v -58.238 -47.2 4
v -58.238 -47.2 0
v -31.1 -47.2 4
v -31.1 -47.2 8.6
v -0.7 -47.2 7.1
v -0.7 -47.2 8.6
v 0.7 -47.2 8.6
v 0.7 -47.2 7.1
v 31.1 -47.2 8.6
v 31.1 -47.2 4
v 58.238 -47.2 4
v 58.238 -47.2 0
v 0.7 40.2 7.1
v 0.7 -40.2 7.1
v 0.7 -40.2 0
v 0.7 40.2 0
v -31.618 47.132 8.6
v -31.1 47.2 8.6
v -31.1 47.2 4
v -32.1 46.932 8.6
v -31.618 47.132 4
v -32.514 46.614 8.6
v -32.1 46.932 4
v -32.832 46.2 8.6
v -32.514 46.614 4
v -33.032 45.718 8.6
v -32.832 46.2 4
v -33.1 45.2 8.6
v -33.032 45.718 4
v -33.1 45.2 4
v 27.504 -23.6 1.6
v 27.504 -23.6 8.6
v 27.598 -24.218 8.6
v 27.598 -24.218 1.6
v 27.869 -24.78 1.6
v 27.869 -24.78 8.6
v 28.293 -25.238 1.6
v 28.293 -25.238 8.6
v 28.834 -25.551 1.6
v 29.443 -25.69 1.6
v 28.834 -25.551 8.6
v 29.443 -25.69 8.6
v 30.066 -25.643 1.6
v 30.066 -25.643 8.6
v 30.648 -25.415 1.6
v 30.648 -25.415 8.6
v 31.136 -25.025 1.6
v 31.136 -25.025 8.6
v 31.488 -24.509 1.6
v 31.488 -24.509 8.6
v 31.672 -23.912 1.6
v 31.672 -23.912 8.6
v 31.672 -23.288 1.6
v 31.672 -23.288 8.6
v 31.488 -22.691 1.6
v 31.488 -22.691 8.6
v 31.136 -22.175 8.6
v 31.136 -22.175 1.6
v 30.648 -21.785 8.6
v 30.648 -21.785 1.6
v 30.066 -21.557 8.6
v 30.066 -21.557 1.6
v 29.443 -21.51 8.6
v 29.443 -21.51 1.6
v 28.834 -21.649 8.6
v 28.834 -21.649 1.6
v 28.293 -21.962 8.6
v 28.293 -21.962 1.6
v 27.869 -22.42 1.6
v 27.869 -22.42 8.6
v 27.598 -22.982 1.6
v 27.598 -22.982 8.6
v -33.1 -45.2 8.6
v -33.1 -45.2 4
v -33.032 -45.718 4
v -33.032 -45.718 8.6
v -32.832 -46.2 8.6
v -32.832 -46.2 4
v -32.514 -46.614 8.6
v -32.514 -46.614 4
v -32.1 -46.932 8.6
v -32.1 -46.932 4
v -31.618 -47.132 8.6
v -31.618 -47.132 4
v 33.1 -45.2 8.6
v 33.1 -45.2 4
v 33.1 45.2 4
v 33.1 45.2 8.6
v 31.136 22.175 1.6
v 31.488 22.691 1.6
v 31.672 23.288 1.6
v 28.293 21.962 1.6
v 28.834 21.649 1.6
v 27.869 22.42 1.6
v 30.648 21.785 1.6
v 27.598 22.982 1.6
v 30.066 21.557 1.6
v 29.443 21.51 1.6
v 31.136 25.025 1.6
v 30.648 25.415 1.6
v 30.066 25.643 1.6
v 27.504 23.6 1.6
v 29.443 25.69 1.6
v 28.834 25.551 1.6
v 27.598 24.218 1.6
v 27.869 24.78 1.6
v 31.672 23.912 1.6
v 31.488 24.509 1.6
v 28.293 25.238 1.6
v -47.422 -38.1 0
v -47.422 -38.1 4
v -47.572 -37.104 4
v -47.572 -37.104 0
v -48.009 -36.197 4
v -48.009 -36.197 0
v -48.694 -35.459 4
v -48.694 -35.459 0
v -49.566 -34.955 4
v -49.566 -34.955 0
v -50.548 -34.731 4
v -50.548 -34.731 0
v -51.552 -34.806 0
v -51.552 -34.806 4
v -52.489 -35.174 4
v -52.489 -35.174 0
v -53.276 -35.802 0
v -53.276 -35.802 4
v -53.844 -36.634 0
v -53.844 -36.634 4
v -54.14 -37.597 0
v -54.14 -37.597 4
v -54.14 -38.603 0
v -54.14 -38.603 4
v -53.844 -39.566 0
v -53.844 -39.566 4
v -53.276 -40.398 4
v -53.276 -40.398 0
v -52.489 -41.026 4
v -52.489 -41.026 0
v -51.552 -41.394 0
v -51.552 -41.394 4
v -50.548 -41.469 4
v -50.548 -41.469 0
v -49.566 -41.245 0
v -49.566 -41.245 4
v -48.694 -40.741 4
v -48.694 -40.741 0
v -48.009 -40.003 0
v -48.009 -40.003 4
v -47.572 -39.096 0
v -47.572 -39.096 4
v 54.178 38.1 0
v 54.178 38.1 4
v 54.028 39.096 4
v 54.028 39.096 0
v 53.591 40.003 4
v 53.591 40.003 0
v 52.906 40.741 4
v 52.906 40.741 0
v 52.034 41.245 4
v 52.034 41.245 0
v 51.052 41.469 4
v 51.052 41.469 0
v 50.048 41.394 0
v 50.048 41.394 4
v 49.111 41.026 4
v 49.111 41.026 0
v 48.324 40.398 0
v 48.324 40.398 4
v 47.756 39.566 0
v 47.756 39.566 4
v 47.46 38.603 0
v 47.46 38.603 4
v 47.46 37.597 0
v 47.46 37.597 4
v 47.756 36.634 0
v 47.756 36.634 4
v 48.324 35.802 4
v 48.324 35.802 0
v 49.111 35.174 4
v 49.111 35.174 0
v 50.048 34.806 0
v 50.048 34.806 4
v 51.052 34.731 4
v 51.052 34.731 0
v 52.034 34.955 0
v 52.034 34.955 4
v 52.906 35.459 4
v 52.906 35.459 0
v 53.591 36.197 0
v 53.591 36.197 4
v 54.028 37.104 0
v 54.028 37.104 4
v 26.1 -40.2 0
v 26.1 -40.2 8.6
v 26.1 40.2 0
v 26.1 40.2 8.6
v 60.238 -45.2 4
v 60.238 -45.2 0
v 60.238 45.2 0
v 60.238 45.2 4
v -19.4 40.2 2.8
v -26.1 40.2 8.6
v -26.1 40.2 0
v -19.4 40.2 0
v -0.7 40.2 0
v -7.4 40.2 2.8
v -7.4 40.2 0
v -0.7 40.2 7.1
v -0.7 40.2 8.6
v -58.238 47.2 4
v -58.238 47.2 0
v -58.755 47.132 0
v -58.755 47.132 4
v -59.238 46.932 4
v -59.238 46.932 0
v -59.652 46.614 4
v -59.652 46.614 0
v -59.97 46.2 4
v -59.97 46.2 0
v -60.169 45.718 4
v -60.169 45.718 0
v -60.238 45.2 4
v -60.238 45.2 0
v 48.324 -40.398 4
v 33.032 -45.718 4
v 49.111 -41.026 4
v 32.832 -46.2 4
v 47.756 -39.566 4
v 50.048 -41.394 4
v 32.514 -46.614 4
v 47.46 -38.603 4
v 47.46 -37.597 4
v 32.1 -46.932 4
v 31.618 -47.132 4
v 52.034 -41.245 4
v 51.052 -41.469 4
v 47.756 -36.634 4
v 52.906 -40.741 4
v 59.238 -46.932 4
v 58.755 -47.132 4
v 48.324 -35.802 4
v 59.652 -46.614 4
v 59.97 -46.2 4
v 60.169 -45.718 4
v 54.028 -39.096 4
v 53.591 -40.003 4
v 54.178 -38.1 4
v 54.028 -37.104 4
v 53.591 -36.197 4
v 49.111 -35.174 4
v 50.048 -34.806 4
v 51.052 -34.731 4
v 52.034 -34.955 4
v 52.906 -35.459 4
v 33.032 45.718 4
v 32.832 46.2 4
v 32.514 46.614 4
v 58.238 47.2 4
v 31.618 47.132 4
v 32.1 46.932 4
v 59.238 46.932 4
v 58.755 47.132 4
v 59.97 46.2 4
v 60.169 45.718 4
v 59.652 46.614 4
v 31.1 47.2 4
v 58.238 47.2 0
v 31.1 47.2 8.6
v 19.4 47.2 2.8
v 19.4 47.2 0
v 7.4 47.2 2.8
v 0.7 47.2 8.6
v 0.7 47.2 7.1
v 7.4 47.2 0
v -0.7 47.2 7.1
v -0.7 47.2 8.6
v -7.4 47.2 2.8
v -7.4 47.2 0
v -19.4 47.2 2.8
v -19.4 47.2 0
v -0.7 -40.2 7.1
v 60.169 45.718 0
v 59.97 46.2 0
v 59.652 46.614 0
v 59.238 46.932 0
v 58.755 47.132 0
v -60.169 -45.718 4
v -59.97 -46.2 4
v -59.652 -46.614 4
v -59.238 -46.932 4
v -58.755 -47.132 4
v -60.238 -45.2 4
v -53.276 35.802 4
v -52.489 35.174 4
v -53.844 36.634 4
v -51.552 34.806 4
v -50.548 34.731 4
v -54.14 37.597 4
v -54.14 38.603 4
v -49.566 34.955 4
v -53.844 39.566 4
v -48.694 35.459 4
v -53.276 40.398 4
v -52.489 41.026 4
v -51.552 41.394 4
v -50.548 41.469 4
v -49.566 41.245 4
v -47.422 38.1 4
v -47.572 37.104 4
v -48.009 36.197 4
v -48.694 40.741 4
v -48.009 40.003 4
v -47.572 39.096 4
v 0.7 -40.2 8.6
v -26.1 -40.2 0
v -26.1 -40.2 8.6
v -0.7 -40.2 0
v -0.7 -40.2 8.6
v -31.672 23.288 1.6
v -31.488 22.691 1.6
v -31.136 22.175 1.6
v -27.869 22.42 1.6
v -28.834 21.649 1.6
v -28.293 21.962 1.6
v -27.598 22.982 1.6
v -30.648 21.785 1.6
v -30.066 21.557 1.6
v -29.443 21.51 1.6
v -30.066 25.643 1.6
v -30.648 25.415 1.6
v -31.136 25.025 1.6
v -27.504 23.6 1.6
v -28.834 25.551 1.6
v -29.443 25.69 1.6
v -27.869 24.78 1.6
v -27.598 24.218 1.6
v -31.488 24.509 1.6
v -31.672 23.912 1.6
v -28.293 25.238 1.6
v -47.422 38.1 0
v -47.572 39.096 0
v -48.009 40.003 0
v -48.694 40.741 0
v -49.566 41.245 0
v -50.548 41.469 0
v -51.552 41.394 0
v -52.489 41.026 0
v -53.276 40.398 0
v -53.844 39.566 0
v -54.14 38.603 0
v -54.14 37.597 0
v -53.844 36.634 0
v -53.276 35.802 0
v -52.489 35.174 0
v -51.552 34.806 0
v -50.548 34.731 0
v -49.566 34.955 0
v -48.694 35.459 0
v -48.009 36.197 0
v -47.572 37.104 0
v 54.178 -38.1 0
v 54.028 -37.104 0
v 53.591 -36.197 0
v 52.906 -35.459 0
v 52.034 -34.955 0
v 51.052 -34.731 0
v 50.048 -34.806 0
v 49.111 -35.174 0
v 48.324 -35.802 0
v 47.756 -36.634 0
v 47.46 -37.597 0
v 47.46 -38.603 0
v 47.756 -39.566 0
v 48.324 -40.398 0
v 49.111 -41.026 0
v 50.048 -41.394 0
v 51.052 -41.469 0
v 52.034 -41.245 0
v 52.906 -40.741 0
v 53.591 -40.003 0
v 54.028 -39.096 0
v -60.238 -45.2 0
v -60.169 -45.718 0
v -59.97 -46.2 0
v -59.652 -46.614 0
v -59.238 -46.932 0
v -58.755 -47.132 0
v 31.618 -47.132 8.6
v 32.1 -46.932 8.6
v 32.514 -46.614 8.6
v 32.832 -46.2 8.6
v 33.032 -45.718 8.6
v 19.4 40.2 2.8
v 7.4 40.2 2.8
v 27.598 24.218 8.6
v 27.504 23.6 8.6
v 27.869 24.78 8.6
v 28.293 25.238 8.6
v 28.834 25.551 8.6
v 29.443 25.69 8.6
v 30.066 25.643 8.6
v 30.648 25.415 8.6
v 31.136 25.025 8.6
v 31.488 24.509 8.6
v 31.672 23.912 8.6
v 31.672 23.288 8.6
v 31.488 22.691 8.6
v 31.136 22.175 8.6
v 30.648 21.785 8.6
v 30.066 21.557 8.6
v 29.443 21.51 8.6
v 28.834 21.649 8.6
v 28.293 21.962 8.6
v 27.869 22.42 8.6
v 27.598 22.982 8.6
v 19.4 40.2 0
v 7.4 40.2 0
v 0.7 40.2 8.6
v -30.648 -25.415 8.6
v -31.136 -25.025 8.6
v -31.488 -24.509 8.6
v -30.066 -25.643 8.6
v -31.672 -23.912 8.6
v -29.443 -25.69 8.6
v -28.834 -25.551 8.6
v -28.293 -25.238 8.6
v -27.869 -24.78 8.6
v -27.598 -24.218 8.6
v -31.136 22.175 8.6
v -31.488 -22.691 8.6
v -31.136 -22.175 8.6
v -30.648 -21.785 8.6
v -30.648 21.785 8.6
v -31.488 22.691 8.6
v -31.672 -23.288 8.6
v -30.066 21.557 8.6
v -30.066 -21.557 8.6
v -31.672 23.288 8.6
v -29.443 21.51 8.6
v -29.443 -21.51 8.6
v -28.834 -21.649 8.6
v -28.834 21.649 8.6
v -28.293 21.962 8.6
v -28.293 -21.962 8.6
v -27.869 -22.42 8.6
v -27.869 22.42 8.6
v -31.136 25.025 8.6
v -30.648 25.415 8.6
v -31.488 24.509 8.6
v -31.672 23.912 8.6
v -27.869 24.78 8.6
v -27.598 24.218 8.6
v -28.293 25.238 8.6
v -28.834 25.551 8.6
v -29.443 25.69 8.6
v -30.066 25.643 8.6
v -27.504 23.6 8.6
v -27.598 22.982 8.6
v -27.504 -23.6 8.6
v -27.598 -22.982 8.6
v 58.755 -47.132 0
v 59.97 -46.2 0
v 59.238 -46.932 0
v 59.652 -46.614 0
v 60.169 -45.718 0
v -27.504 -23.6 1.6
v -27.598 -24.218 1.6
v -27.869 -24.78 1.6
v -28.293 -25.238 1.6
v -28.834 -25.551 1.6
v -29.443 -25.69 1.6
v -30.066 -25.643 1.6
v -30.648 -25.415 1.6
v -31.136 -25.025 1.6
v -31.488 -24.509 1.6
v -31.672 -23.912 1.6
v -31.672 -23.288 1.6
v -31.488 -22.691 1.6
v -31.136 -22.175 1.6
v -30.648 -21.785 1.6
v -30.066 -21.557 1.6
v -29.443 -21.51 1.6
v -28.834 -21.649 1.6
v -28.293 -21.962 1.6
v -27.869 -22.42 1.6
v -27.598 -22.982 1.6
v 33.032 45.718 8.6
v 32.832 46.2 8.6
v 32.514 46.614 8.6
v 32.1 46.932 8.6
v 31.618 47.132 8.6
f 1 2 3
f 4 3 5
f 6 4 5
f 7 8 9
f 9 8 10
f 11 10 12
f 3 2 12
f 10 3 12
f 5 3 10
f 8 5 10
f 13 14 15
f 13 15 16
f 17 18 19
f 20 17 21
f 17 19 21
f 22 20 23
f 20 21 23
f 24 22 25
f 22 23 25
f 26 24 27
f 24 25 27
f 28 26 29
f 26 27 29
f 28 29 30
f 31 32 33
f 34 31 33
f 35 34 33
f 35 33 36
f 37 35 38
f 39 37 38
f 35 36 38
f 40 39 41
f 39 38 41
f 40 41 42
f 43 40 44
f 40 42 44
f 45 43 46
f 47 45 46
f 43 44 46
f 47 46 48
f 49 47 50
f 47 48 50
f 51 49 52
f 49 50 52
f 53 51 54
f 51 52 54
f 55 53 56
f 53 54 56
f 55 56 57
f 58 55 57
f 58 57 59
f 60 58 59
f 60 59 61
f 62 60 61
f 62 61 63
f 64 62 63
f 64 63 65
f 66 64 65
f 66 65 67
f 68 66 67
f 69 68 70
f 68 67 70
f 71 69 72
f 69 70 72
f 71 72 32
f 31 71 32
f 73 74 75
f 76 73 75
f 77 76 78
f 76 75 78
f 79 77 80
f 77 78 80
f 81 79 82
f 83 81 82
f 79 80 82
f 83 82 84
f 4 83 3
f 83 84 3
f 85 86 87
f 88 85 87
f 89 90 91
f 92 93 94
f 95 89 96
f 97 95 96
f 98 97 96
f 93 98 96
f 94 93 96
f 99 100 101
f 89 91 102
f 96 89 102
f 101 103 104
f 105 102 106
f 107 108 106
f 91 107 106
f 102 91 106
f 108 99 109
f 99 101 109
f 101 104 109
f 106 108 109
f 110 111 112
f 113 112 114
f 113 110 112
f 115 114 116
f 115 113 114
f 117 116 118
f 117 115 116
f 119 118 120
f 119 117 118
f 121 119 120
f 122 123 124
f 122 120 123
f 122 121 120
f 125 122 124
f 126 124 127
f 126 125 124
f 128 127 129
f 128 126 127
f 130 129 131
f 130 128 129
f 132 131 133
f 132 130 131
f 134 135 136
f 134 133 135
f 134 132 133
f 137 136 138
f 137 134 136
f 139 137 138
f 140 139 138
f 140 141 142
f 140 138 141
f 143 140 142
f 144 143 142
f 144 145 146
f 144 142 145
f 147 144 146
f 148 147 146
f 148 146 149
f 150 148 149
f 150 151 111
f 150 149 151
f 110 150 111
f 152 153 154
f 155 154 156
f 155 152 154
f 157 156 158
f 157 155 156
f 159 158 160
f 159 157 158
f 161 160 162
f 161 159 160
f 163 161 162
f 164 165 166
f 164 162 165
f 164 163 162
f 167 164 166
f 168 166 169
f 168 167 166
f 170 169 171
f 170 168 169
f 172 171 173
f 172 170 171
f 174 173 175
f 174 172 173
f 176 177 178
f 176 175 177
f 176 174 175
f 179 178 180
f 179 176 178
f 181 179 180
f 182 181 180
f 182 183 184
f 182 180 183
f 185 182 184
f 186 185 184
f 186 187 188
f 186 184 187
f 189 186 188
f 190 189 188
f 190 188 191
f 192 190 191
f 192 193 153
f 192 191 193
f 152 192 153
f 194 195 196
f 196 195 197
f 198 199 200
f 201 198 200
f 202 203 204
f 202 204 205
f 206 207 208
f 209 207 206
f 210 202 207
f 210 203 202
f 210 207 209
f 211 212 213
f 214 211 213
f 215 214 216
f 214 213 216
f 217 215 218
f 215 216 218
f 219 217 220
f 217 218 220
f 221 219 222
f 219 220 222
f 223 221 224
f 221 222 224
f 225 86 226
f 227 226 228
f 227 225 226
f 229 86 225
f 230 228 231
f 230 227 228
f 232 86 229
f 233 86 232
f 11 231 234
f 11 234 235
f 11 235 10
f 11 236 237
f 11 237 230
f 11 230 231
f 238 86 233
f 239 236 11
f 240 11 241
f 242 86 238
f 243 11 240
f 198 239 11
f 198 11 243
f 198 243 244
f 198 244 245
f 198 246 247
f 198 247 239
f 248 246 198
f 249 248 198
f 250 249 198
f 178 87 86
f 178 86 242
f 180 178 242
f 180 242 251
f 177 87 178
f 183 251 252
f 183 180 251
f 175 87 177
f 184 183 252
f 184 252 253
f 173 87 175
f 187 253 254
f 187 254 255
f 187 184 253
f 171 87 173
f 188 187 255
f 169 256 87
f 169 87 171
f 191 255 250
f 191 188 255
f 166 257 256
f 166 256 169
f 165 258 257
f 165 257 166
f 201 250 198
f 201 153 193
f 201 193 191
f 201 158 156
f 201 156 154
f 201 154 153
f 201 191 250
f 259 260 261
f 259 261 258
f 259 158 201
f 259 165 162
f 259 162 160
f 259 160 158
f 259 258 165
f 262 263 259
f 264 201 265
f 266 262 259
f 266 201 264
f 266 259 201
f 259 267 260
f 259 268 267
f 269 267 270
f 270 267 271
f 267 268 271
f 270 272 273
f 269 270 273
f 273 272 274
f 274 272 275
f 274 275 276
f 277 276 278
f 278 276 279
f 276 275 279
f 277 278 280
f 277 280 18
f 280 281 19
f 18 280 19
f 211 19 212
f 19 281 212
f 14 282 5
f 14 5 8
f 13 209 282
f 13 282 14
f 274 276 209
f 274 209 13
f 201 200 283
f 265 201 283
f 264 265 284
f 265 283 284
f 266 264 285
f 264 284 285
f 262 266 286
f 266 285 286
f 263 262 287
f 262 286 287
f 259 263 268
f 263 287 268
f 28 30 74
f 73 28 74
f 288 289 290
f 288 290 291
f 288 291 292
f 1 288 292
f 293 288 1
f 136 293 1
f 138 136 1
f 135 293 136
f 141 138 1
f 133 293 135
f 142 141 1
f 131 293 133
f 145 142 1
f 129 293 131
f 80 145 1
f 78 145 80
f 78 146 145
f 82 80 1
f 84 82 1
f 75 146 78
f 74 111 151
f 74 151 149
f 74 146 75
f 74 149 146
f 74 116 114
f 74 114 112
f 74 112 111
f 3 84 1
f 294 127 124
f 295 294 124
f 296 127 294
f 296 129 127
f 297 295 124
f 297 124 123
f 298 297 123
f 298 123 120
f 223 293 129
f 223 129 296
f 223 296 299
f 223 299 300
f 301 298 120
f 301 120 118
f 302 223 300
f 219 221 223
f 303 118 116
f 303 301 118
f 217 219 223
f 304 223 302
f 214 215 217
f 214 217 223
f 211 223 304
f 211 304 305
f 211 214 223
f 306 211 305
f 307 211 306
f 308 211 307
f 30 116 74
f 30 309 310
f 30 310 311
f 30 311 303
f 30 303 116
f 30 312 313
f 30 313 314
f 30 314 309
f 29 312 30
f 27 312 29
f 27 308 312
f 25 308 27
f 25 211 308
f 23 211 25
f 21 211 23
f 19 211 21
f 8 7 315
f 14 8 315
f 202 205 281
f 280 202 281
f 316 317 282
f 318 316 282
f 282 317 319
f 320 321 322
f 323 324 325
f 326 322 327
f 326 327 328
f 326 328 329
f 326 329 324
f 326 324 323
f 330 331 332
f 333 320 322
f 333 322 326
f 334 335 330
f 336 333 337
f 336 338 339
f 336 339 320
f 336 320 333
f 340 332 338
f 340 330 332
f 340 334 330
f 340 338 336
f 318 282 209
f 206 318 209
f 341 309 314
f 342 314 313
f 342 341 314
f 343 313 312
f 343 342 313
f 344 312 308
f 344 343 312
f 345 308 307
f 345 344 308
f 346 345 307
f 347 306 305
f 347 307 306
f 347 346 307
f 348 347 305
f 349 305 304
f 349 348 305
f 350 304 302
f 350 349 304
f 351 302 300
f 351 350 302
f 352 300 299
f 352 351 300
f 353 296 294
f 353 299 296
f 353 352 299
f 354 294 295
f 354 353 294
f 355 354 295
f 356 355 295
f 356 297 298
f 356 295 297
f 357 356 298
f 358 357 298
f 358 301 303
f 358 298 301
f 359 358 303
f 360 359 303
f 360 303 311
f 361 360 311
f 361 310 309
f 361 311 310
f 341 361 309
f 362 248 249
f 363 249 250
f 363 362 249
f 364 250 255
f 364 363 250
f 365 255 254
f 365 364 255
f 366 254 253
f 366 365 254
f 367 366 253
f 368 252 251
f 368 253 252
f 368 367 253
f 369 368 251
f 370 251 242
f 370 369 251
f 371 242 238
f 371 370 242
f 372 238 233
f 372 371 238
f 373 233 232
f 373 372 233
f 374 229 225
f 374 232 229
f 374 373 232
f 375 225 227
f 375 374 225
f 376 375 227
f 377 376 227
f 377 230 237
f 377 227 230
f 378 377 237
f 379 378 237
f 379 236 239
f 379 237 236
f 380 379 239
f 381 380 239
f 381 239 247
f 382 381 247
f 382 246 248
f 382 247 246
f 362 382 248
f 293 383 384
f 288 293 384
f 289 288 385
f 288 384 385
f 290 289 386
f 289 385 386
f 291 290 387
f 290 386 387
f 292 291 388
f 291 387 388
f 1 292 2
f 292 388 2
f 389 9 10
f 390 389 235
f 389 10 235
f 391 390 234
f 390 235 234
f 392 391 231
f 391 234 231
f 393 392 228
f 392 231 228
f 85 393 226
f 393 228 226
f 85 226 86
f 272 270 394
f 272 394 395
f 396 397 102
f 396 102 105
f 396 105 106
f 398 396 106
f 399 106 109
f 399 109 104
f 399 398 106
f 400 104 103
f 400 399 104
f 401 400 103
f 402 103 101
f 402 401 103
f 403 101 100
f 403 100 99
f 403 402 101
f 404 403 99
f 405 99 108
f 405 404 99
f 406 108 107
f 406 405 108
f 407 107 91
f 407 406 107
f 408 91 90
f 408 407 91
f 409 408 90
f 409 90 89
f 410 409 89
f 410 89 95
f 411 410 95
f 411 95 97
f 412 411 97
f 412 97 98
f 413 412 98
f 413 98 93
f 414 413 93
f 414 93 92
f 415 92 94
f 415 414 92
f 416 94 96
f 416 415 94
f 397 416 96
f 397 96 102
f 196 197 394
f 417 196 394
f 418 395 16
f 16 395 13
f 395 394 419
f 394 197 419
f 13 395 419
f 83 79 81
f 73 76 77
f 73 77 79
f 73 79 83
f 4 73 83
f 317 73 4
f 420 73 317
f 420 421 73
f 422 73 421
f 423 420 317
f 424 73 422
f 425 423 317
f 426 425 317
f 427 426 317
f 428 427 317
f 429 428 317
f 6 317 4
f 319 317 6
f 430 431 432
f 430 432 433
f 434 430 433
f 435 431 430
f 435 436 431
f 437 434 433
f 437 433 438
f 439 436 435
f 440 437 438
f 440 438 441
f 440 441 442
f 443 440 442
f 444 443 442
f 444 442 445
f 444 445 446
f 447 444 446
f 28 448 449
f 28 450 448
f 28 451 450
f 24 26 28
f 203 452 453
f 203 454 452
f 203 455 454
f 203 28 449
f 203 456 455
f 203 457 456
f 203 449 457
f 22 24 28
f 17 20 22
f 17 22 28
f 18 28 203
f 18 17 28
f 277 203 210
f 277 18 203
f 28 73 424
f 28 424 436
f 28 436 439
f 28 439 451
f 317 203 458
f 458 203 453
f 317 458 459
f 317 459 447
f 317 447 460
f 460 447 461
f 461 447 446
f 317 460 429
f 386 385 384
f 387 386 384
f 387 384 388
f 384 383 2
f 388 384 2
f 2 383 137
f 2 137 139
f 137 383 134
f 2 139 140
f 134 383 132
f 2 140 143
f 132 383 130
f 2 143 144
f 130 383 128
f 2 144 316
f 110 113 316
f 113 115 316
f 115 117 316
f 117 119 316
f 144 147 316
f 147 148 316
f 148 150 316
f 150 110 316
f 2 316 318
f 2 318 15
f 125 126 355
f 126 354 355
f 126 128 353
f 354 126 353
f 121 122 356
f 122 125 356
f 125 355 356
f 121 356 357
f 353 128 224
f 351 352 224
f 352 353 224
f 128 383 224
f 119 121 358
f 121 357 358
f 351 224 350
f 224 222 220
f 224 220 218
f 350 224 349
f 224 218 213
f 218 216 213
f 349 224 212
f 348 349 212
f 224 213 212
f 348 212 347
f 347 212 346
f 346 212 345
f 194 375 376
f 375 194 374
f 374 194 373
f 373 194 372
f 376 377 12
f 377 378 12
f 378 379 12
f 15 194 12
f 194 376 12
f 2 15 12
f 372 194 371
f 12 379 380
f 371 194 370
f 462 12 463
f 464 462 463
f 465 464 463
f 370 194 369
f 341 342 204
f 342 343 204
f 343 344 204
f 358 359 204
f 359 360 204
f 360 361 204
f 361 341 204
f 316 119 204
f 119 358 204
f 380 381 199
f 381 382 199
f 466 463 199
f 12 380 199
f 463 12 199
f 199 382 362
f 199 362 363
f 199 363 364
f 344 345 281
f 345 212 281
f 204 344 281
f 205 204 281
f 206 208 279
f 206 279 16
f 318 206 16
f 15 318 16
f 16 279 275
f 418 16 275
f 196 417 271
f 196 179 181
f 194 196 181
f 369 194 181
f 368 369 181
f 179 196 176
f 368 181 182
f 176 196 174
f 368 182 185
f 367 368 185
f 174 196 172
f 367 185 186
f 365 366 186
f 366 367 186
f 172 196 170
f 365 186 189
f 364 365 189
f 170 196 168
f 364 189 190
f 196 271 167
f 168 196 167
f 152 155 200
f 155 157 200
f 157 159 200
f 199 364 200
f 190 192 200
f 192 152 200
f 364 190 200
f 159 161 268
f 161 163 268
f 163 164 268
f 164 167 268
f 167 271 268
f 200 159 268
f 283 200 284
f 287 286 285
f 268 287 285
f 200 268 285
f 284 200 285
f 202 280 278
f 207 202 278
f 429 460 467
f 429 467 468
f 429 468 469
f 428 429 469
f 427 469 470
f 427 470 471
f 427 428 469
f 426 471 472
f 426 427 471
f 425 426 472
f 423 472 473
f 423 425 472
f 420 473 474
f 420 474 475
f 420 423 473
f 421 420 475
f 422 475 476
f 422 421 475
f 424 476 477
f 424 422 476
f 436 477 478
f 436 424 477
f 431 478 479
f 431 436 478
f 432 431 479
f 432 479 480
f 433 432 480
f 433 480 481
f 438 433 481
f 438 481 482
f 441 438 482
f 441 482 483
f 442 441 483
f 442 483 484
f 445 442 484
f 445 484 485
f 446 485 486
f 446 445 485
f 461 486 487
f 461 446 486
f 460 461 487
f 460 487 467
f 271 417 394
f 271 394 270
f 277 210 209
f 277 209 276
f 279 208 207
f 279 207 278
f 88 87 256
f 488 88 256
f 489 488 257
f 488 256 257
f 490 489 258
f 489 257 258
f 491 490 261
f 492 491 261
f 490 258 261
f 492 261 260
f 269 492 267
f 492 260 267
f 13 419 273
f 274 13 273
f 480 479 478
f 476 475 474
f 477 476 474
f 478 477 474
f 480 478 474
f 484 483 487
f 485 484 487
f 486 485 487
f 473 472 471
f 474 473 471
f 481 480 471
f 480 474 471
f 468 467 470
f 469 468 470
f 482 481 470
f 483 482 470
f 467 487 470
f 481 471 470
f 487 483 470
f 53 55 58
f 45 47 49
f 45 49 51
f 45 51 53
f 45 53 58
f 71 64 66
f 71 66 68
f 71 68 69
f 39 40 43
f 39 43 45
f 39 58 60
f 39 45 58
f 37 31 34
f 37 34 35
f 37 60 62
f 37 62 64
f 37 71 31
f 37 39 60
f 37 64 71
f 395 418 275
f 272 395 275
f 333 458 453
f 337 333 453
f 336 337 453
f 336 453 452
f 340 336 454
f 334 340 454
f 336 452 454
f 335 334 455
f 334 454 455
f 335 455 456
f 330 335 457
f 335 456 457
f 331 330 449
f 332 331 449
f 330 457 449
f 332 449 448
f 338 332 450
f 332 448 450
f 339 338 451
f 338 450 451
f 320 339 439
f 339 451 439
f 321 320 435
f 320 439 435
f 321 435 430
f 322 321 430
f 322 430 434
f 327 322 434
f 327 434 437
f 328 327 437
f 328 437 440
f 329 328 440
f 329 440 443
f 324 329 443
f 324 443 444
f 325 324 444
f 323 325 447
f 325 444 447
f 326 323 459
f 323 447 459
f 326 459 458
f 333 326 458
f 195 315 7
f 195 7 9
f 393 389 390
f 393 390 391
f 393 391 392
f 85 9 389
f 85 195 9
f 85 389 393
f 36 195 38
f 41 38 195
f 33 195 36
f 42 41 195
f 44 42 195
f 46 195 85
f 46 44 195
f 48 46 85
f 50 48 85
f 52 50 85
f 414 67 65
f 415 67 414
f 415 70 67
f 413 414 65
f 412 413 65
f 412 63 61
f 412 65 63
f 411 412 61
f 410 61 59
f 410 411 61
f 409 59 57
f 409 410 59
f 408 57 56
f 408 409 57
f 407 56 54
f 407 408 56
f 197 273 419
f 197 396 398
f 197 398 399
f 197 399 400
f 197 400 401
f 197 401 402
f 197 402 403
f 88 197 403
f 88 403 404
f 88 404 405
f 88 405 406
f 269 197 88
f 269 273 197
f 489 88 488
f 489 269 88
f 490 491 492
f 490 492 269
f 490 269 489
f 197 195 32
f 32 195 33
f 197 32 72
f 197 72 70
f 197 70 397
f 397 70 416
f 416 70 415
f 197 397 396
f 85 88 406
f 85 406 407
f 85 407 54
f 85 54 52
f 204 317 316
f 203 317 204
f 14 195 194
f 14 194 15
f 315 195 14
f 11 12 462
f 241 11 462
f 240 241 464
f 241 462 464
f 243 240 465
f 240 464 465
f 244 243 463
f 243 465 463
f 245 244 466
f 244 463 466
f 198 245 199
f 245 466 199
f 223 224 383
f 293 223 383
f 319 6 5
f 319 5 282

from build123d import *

# Parameters (mm, degrees)
PAD_DEPTH                     = 8.6
PAD001_DEPTH                  = 4
SKETCH002_W                   = 1.4
SKETCH002_H                   = 94.4
POCKET001_DEPTH               = 1.5
SKETCH003_W                   = 25.4
SKETCH003_H                   = 80.4
POCKET_DEPTH                  = 8.6
SKETCH009_R                   = 3.3782
POCKET008_DEPTH               = 8.601
SKETCH008_R                   = 2.0955
POCKET005_DEPTH               = 7
SKETCH008_MIRRORED004_2_R     = 2.0955
POCKET005_MIRRORED004_2_DEPTH = 7
SKETCH010_W                   = 12
SKETCH010_H                   = 7
POCKET007_DEPTH               = 2.8


with BuildPart() as part:
    # Sketch → Pad (new body)
    with BuildSketch(Plane.XY):
        with BuildLine():
            Line((-33.1, 45.2), (-33.1, -45.2))
            ThreePointArc((-33.1, -45.2), (-32.514214, -46.614214), (-31.1, -47.2))
            Line((-31.1, -47.2), (31.1, -47.2))
            ThreePointArc((31.1, -47.2), (32.514214, -46.614214), (33.1, -45.2))
            Line((33.1, -45.2), (33.1, 45.2))
            ThreePointArc((33.1, 45.2), (32.514214, 46.614214), (31.1, 47.2))
            Line((31.1, 47.2), (-31.1, 47.2))
            ThreePointArc((-31.1, 47.2), (-32.514214, 46.614214), (-33.1, 45.2))
        make_face()
    extrude(amount=PAD_DEPTH)

    # Sketch007 → Pad001 (join)
    with BuildSketch(Plane.XY):
        with BuildLine():
            Line((-60.2375, 45.2), (-60.2375, -45.2))
            ThreePointArc((-60.2375, -45.2), (-59.651714, -46.614214), (-58.2375, -47.2))
            Line((-58.2375, -47.2), (58.2375, -47.2))
            ThreePointArc((58.2375, -47.2), (59.651714, -46.614214), (60.2375, -45.2))
            Line((60.2375, -45.2), (60.2375, 45.2))
            ThreePointArc((60.2375, 45.2), (59.651714, 46.614214), (58.2375, 47.2))
            Line((58.2375, 47.2), (-58.2375, 47.2))
            ThreePointArc((-58.2375, 47.2), (-59.651714, 46.614214), (-60.2375, 45.2))
        make_face()
    extrude(amount=PAD001_DEPTH)

    # Sketch002 (on DatumPlane) → Pocket001 (cut)
    with BuildSketch(Plane.XY.offset(8.6)):
        Rectangle(SKETCH002_W, SKETCH002_H)
    extrude(amount=-POCKET001_DEPTH, mode=Mode.SUBTRACT)

    # Sketch003 (on DatumPlane) → Pocket (cut)
    with BuildSketch(Plane.XY.offset(8.6)):
        with Locations((-13.4, 0)):
            Rectangle(SKETCH003_W, SKETCH003_H)
    pocket = extrude(amount=-POCKET_DEPTH, mode=Mode.SUBTRACT)

    # Mirrored: Pocket across Sketch003 V_Axis
    add(pocket.mirror(Plane(origin=(0, 0, 8.6), x_dir=(0, 0, 1), z_dir=(1, 0, 0))), mode=Mode.SUBTRACT)

    # Sketch009 → Pocket008 (cut, through all)
    with BuildSketch(Plane.XY):
        with Locations((-50.8, 38.1)):
            Circle(SKETCH009_R)
        with Locations((50.8, 38.1)):
            Circle(SKETCH009_R)
        with Locations((-50.8, -38.1)):
            Circle(SKETCH009_R)
        with Locations((50.8, -38.1)):
            Circle(SKETCH009_R)
    extrude(amount=POCKET008_DEPTH, mode=Mode.SUBTRACT)

    # Sketch008 (on DatumPlane) → Pocket005 (cut)
    with BuildSketch(Plane.XY.offset(8.6)):
        with Locations((-29.6, 23.6)):
            Circle(SKETCH008_R)
    pocket005 = extrude(amount=-POCKET005_DEPTH, mode=Mode.SUBTRACT)

    # Sketch008 Mirrored004 2 → Pocket005 Mirrored004 2 (cut)
    with BuildSketch(Plane(origin=(0, 0, 8.6), x_dir=(-1, 0, 0), z_dir=(0, 0, -1))):
        with Locations((-29.6, 23.6)):
            Circle(SKETCH008_MIRRORED004_2_R)
    pocket005_mirrored004_2 = extrude(amount=POCKET005_MIRRORED004_2_DEPTH, mode=Mode.SUBTRACT)

    # Mirrored005: Pocket005, Pocket005 Mirrored004 2 across XZ
    add(pocket005.mirror(Plane.XZ), mode=Mode.SUBTRACT)
    add(pocket005_mirrored004_2.mirror(Plane.XZ), mode=Mode.SUBTRACT)

    # Sketch010 → Pocket007 (cut)
    with BuildSketch(Plane.XY):
        with Locations((-13.4, 43.7)):
            Rectangle(SKETCH010_W, SKETCH010_H)
    pocket007 = extrude(amount=POCKET007_DEPTH, mode=Mode.SUBTRACT)

    # Mirrored006: Pocket007 across Sketch010 V_Axis
    add(pocket007.mirror(Plane(origin=(0, 0, 0), x_dir=(0, 0, 1), z_dir=(1, 0, 0))), mode=Mode.SUBTRACT)


solid = part.part
